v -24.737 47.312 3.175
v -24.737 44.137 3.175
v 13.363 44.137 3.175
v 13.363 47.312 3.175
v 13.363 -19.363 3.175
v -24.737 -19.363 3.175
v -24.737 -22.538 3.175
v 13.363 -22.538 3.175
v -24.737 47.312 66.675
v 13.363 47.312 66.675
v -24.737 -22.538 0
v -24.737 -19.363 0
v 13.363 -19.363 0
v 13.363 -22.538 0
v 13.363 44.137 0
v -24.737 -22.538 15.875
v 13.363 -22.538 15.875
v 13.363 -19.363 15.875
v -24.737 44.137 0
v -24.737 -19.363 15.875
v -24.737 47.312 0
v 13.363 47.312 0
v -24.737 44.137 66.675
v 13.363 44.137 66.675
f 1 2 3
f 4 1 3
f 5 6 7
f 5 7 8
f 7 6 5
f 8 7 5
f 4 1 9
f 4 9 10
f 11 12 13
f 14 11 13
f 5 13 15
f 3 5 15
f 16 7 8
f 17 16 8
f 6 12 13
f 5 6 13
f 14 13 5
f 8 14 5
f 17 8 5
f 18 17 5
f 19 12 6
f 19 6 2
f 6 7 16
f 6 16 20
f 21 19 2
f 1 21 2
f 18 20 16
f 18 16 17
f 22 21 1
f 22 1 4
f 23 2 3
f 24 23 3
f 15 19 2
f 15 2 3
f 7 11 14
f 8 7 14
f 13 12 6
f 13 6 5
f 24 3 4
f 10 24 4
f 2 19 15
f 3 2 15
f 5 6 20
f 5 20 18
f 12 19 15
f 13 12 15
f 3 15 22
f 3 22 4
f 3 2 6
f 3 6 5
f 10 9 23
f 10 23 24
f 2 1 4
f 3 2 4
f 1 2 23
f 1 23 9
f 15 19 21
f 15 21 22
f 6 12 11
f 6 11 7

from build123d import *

# Parameters (mm, degrees)
F0_W     = 38.1
F0_H     = 63.5
F1_DEPTH = 3.175
F2_W     = 38.1
F2_H     = 3.175
F3_DEPTH = 63.5
F4_DEPTH = 3.175
F5_W     = 38.1
F5_H     = 3.175
F6_DEPTH = 12.7
F7_DEPTH = 3.175


with BuildPart() as f1:
    # F0 (on Top) → F1 (new body)
    with BuildSketch(Plane.XY):
        with Locations((-5.6869531982, 12.3874891467)):
            Rectangle(F0_W, F0_H)
    extrude(amount=F1_DEPTH)


with BuildPart() as f3:
    # F2 (on face) → F3 (new body)
    with BuildSketch(Plane.XY.offset(3.175)):
        with Locations((-5.6869531982, 45.7249891467)):
            Rectangle(F2_W, F2_H)
    extrude(amount=F3_DEPTH)


with BuildPart() as f4:
    # F4 (new): a face of the model
    f4_faces = [f1.part.faces().sort_by_distance(p)[0] for p in [
        (-5.6869531982, 44.1374891467, 1.5875),
    ]]
    extrude(f4_faces, amount=F4_DEPTH)


with BuildPart() as f6:
    # F5 (on face) → F6 (new body)
    with BuildSketch(Plane.XY.offset(3.175)):
        with Locations((-5.6869531982, -20.9500108533)):
            Rectangle(F5_W, F5_H)
    extrude(amount=F6_DEPTH)


with BuildPart() as f7:
    # F7 (new): a face of the model
    f7_faces = [f1.part.faces().sort_by_distance(p)[0] for p in [
        (-5.6869531982, -19.3625108533, 1.5875),
    ]]
    extrude(f7_faces, amount=F7_DEPTH)


solid = Compound([f1.part, f3.part, f4.part, f6.part, f7.part])
